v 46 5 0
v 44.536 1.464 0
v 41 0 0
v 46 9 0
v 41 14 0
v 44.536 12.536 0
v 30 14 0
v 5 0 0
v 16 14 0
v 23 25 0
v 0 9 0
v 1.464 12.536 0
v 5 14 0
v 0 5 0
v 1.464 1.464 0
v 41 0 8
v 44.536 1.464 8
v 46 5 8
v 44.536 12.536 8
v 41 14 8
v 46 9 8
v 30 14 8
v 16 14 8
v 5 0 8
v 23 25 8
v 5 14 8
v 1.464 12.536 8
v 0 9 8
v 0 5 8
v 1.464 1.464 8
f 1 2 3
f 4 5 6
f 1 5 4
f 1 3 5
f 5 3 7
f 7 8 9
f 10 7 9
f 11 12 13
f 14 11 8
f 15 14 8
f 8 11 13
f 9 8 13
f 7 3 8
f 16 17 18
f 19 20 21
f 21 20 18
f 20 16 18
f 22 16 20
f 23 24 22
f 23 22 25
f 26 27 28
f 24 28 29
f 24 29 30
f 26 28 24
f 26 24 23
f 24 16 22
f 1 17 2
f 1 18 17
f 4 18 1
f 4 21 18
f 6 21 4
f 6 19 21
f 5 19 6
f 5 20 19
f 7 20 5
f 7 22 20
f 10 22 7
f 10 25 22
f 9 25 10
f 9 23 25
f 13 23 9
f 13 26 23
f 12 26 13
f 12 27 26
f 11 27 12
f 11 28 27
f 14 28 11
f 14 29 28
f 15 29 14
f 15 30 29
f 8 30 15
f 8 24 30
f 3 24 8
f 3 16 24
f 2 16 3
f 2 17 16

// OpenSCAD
$fn = 32;

// ----------------------------------------------------------------------
// Ratchet pawl: 46 x 14 mm body, beak 11 mm сверху
// ----------------------------------------------------------------------

// --- parameters (mm) ---
profile_height = 8;       // extrusion height
profile_points = 15;      // points of the closed outline

profile = [[0, 5], [1.464, 1.464], [5, 0], [41, 0], [44.536, 1.464], [46, 5], [46, 9], [44.536, 12.536], [41, 14], [30, 14], [23, 25], [16, 14], [5, 14], [1.464, 12.536], [0, 9]];  // single closed polygon, 15 points, counter clockwise

// --- the one profile operation ---
linear_extrude(height = profile_height) polygon(points = profile);
